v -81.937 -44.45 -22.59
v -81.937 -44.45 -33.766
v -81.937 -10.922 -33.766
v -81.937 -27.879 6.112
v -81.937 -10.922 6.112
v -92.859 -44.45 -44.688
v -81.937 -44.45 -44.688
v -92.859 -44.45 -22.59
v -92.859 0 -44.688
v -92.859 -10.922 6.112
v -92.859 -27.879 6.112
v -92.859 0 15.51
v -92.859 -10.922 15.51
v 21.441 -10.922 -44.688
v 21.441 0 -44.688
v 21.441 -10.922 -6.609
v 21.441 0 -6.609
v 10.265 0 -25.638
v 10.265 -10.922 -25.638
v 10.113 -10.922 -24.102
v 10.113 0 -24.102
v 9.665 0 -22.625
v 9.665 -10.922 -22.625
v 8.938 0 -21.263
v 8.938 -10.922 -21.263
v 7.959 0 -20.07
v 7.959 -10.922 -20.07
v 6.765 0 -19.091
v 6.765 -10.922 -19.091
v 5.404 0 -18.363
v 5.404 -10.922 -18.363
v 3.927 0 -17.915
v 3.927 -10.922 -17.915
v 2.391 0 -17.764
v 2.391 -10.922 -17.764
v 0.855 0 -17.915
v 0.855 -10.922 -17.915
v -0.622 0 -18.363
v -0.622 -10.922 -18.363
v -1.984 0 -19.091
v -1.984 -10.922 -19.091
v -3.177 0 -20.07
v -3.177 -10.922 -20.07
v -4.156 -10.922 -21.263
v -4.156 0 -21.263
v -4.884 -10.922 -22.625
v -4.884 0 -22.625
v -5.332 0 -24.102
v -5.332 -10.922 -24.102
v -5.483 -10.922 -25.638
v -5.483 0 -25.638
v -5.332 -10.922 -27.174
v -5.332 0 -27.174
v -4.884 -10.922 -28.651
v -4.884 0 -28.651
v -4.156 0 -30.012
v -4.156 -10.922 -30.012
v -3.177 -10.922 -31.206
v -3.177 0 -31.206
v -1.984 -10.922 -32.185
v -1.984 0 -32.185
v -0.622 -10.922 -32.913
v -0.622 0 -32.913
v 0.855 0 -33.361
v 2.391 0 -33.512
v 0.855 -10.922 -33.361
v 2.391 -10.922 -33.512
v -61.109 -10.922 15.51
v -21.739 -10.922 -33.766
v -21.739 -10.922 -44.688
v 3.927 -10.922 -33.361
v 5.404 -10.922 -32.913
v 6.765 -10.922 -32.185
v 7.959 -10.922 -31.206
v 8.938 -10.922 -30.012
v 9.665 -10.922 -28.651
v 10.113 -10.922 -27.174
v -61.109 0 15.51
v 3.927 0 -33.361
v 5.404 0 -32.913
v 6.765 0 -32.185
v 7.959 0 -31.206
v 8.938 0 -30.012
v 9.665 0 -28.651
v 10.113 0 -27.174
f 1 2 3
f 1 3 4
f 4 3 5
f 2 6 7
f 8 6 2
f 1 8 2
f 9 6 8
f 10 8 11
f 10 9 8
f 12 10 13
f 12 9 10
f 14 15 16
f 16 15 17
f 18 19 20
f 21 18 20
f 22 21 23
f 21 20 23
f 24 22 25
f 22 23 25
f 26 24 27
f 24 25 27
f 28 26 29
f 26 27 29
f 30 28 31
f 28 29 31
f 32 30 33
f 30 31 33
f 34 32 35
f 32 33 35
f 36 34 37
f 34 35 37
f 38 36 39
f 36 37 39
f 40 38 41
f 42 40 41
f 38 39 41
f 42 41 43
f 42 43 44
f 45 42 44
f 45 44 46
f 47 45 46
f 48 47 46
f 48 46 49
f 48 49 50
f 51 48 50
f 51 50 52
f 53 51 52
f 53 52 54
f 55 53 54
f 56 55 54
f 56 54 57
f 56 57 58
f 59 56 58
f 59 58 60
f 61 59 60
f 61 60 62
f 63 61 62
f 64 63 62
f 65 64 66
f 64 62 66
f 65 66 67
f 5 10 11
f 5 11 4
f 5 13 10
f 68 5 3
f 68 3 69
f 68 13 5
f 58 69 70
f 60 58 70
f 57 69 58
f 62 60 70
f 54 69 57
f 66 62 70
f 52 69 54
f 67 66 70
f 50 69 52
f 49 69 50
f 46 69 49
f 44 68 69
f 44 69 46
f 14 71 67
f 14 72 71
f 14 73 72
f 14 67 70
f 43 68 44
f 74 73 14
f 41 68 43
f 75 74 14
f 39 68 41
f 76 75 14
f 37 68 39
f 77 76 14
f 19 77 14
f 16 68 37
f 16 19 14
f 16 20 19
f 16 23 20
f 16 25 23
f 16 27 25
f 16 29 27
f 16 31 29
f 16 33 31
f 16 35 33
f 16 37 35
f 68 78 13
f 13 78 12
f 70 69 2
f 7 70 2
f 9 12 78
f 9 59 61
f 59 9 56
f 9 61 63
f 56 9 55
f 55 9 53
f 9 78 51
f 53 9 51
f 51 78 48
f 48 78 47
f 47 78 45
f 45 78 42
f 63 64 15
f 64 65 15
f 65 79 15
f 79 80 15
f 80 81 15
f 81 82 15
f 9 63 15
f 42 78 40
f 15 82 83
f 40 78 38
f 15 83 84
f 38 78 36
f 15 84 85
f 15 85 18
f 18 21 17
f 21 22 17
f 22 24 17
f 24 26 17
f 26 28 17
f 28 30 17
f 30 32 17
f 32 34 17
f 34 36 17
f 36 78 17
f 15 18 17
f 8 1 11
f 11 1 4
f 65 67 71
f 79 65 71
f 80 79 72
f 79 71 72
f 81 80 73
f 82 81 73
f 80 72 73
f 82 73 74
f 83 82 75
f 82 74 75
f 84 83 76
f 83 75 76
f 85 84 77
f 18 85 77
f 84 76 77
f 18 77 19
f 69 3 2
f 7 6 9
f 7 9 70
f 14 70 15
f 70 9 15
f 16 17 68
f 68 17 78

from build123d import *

# Parameters (mm, degrees)
F1_DEPTH  = 10.922
F2_W      = 10.922
F2_H      = 50.8
F3_DEPTH  = 33.528
F4_W      = 60.198
F4_H      = 10.922
F5_DEPTH  = 33.528
F7_DEPTH  = 25.4
F9_DEPTH  = 10.923
F11_DEPTH = 10.923


with BuildPart() as f1:
    # F0 (on Front) → F1 (new body)
    with BuildSketch(Plane.XZ):
        Polygon((-61.109246, 15.510071), (-92.859246, 15.510071), (-92.859246, -44.687929), (21.440754, -44.687929), (21.440754, -6.609135), align=None)
    extrude(amount=F1_DEPTH)

    # F2 (on face) → F3 (join)
    with BuildSketch(Plane.XZ.offset(10.922)):
        with Locations((-87.398246, -19.287929)):
            Rectangle(F2_W, F2_H)
    extrude(amount=F3_DEPTH)

    # F4 (on face) → F5 (join)
    with BuildSketch(Plane.XZ.offset(10.922)):
        with Locations((-51.838246, -39.226929)):
            Rectangle(F4_W, F4_H)
    extrude(amount=F5_DEPTH)

    # F6 (on face) → F7 (cut)
    with BuildSketch(Plane.XY.offset(-33.765929)):
        Polygon((-21.739246, -10.922), (-81.937246, -44.45), (-21.739246, -44.45), align=None)
    extrude(amount=-F7_DEPTH, mode=Mode.SUBTRACT)

    # F8 (on face) → F9 (cut, through all)
    with BuildSketch(Plane.XZ.offset(10.922)):
        with BuildLine():
            ThreePointArc((10.264754, -25.637929), (-3.177005, -20.070171), (2.390754, -33.511929))
            Line((2.390754, -33.511929), (2.390754, -25.637929))
            Line((2.390754, -25.637929), (10.264754, -25.637929))
        make_face()
        with BuildLine():
            Line((2.390754, -25.637929), (2.390754, -33.511929))
            ThreePointArc((2.390754, -33.511929), (7.958513, -31.205688), (10.264754, -25.637929))
            Line((10.264754, -25.637929), (2.390754, -25.637929))
        make_face()
    extrude(amount=-F9_DEPTH, mode=Mode.SUBTRACT)

    # F10 (on face) → F11 (cut, through all)
    with BuildSketch(Plane.YZ.offset(-81.937246)):
        Polygon((-44.45, 6.112071), (-44.45, -22.589929), (-27.878893, 6.112071), align=None)
    extrude(amount=-F11_DEPTH, mode=Mode.SUBTRACT)


solid = f1.part
